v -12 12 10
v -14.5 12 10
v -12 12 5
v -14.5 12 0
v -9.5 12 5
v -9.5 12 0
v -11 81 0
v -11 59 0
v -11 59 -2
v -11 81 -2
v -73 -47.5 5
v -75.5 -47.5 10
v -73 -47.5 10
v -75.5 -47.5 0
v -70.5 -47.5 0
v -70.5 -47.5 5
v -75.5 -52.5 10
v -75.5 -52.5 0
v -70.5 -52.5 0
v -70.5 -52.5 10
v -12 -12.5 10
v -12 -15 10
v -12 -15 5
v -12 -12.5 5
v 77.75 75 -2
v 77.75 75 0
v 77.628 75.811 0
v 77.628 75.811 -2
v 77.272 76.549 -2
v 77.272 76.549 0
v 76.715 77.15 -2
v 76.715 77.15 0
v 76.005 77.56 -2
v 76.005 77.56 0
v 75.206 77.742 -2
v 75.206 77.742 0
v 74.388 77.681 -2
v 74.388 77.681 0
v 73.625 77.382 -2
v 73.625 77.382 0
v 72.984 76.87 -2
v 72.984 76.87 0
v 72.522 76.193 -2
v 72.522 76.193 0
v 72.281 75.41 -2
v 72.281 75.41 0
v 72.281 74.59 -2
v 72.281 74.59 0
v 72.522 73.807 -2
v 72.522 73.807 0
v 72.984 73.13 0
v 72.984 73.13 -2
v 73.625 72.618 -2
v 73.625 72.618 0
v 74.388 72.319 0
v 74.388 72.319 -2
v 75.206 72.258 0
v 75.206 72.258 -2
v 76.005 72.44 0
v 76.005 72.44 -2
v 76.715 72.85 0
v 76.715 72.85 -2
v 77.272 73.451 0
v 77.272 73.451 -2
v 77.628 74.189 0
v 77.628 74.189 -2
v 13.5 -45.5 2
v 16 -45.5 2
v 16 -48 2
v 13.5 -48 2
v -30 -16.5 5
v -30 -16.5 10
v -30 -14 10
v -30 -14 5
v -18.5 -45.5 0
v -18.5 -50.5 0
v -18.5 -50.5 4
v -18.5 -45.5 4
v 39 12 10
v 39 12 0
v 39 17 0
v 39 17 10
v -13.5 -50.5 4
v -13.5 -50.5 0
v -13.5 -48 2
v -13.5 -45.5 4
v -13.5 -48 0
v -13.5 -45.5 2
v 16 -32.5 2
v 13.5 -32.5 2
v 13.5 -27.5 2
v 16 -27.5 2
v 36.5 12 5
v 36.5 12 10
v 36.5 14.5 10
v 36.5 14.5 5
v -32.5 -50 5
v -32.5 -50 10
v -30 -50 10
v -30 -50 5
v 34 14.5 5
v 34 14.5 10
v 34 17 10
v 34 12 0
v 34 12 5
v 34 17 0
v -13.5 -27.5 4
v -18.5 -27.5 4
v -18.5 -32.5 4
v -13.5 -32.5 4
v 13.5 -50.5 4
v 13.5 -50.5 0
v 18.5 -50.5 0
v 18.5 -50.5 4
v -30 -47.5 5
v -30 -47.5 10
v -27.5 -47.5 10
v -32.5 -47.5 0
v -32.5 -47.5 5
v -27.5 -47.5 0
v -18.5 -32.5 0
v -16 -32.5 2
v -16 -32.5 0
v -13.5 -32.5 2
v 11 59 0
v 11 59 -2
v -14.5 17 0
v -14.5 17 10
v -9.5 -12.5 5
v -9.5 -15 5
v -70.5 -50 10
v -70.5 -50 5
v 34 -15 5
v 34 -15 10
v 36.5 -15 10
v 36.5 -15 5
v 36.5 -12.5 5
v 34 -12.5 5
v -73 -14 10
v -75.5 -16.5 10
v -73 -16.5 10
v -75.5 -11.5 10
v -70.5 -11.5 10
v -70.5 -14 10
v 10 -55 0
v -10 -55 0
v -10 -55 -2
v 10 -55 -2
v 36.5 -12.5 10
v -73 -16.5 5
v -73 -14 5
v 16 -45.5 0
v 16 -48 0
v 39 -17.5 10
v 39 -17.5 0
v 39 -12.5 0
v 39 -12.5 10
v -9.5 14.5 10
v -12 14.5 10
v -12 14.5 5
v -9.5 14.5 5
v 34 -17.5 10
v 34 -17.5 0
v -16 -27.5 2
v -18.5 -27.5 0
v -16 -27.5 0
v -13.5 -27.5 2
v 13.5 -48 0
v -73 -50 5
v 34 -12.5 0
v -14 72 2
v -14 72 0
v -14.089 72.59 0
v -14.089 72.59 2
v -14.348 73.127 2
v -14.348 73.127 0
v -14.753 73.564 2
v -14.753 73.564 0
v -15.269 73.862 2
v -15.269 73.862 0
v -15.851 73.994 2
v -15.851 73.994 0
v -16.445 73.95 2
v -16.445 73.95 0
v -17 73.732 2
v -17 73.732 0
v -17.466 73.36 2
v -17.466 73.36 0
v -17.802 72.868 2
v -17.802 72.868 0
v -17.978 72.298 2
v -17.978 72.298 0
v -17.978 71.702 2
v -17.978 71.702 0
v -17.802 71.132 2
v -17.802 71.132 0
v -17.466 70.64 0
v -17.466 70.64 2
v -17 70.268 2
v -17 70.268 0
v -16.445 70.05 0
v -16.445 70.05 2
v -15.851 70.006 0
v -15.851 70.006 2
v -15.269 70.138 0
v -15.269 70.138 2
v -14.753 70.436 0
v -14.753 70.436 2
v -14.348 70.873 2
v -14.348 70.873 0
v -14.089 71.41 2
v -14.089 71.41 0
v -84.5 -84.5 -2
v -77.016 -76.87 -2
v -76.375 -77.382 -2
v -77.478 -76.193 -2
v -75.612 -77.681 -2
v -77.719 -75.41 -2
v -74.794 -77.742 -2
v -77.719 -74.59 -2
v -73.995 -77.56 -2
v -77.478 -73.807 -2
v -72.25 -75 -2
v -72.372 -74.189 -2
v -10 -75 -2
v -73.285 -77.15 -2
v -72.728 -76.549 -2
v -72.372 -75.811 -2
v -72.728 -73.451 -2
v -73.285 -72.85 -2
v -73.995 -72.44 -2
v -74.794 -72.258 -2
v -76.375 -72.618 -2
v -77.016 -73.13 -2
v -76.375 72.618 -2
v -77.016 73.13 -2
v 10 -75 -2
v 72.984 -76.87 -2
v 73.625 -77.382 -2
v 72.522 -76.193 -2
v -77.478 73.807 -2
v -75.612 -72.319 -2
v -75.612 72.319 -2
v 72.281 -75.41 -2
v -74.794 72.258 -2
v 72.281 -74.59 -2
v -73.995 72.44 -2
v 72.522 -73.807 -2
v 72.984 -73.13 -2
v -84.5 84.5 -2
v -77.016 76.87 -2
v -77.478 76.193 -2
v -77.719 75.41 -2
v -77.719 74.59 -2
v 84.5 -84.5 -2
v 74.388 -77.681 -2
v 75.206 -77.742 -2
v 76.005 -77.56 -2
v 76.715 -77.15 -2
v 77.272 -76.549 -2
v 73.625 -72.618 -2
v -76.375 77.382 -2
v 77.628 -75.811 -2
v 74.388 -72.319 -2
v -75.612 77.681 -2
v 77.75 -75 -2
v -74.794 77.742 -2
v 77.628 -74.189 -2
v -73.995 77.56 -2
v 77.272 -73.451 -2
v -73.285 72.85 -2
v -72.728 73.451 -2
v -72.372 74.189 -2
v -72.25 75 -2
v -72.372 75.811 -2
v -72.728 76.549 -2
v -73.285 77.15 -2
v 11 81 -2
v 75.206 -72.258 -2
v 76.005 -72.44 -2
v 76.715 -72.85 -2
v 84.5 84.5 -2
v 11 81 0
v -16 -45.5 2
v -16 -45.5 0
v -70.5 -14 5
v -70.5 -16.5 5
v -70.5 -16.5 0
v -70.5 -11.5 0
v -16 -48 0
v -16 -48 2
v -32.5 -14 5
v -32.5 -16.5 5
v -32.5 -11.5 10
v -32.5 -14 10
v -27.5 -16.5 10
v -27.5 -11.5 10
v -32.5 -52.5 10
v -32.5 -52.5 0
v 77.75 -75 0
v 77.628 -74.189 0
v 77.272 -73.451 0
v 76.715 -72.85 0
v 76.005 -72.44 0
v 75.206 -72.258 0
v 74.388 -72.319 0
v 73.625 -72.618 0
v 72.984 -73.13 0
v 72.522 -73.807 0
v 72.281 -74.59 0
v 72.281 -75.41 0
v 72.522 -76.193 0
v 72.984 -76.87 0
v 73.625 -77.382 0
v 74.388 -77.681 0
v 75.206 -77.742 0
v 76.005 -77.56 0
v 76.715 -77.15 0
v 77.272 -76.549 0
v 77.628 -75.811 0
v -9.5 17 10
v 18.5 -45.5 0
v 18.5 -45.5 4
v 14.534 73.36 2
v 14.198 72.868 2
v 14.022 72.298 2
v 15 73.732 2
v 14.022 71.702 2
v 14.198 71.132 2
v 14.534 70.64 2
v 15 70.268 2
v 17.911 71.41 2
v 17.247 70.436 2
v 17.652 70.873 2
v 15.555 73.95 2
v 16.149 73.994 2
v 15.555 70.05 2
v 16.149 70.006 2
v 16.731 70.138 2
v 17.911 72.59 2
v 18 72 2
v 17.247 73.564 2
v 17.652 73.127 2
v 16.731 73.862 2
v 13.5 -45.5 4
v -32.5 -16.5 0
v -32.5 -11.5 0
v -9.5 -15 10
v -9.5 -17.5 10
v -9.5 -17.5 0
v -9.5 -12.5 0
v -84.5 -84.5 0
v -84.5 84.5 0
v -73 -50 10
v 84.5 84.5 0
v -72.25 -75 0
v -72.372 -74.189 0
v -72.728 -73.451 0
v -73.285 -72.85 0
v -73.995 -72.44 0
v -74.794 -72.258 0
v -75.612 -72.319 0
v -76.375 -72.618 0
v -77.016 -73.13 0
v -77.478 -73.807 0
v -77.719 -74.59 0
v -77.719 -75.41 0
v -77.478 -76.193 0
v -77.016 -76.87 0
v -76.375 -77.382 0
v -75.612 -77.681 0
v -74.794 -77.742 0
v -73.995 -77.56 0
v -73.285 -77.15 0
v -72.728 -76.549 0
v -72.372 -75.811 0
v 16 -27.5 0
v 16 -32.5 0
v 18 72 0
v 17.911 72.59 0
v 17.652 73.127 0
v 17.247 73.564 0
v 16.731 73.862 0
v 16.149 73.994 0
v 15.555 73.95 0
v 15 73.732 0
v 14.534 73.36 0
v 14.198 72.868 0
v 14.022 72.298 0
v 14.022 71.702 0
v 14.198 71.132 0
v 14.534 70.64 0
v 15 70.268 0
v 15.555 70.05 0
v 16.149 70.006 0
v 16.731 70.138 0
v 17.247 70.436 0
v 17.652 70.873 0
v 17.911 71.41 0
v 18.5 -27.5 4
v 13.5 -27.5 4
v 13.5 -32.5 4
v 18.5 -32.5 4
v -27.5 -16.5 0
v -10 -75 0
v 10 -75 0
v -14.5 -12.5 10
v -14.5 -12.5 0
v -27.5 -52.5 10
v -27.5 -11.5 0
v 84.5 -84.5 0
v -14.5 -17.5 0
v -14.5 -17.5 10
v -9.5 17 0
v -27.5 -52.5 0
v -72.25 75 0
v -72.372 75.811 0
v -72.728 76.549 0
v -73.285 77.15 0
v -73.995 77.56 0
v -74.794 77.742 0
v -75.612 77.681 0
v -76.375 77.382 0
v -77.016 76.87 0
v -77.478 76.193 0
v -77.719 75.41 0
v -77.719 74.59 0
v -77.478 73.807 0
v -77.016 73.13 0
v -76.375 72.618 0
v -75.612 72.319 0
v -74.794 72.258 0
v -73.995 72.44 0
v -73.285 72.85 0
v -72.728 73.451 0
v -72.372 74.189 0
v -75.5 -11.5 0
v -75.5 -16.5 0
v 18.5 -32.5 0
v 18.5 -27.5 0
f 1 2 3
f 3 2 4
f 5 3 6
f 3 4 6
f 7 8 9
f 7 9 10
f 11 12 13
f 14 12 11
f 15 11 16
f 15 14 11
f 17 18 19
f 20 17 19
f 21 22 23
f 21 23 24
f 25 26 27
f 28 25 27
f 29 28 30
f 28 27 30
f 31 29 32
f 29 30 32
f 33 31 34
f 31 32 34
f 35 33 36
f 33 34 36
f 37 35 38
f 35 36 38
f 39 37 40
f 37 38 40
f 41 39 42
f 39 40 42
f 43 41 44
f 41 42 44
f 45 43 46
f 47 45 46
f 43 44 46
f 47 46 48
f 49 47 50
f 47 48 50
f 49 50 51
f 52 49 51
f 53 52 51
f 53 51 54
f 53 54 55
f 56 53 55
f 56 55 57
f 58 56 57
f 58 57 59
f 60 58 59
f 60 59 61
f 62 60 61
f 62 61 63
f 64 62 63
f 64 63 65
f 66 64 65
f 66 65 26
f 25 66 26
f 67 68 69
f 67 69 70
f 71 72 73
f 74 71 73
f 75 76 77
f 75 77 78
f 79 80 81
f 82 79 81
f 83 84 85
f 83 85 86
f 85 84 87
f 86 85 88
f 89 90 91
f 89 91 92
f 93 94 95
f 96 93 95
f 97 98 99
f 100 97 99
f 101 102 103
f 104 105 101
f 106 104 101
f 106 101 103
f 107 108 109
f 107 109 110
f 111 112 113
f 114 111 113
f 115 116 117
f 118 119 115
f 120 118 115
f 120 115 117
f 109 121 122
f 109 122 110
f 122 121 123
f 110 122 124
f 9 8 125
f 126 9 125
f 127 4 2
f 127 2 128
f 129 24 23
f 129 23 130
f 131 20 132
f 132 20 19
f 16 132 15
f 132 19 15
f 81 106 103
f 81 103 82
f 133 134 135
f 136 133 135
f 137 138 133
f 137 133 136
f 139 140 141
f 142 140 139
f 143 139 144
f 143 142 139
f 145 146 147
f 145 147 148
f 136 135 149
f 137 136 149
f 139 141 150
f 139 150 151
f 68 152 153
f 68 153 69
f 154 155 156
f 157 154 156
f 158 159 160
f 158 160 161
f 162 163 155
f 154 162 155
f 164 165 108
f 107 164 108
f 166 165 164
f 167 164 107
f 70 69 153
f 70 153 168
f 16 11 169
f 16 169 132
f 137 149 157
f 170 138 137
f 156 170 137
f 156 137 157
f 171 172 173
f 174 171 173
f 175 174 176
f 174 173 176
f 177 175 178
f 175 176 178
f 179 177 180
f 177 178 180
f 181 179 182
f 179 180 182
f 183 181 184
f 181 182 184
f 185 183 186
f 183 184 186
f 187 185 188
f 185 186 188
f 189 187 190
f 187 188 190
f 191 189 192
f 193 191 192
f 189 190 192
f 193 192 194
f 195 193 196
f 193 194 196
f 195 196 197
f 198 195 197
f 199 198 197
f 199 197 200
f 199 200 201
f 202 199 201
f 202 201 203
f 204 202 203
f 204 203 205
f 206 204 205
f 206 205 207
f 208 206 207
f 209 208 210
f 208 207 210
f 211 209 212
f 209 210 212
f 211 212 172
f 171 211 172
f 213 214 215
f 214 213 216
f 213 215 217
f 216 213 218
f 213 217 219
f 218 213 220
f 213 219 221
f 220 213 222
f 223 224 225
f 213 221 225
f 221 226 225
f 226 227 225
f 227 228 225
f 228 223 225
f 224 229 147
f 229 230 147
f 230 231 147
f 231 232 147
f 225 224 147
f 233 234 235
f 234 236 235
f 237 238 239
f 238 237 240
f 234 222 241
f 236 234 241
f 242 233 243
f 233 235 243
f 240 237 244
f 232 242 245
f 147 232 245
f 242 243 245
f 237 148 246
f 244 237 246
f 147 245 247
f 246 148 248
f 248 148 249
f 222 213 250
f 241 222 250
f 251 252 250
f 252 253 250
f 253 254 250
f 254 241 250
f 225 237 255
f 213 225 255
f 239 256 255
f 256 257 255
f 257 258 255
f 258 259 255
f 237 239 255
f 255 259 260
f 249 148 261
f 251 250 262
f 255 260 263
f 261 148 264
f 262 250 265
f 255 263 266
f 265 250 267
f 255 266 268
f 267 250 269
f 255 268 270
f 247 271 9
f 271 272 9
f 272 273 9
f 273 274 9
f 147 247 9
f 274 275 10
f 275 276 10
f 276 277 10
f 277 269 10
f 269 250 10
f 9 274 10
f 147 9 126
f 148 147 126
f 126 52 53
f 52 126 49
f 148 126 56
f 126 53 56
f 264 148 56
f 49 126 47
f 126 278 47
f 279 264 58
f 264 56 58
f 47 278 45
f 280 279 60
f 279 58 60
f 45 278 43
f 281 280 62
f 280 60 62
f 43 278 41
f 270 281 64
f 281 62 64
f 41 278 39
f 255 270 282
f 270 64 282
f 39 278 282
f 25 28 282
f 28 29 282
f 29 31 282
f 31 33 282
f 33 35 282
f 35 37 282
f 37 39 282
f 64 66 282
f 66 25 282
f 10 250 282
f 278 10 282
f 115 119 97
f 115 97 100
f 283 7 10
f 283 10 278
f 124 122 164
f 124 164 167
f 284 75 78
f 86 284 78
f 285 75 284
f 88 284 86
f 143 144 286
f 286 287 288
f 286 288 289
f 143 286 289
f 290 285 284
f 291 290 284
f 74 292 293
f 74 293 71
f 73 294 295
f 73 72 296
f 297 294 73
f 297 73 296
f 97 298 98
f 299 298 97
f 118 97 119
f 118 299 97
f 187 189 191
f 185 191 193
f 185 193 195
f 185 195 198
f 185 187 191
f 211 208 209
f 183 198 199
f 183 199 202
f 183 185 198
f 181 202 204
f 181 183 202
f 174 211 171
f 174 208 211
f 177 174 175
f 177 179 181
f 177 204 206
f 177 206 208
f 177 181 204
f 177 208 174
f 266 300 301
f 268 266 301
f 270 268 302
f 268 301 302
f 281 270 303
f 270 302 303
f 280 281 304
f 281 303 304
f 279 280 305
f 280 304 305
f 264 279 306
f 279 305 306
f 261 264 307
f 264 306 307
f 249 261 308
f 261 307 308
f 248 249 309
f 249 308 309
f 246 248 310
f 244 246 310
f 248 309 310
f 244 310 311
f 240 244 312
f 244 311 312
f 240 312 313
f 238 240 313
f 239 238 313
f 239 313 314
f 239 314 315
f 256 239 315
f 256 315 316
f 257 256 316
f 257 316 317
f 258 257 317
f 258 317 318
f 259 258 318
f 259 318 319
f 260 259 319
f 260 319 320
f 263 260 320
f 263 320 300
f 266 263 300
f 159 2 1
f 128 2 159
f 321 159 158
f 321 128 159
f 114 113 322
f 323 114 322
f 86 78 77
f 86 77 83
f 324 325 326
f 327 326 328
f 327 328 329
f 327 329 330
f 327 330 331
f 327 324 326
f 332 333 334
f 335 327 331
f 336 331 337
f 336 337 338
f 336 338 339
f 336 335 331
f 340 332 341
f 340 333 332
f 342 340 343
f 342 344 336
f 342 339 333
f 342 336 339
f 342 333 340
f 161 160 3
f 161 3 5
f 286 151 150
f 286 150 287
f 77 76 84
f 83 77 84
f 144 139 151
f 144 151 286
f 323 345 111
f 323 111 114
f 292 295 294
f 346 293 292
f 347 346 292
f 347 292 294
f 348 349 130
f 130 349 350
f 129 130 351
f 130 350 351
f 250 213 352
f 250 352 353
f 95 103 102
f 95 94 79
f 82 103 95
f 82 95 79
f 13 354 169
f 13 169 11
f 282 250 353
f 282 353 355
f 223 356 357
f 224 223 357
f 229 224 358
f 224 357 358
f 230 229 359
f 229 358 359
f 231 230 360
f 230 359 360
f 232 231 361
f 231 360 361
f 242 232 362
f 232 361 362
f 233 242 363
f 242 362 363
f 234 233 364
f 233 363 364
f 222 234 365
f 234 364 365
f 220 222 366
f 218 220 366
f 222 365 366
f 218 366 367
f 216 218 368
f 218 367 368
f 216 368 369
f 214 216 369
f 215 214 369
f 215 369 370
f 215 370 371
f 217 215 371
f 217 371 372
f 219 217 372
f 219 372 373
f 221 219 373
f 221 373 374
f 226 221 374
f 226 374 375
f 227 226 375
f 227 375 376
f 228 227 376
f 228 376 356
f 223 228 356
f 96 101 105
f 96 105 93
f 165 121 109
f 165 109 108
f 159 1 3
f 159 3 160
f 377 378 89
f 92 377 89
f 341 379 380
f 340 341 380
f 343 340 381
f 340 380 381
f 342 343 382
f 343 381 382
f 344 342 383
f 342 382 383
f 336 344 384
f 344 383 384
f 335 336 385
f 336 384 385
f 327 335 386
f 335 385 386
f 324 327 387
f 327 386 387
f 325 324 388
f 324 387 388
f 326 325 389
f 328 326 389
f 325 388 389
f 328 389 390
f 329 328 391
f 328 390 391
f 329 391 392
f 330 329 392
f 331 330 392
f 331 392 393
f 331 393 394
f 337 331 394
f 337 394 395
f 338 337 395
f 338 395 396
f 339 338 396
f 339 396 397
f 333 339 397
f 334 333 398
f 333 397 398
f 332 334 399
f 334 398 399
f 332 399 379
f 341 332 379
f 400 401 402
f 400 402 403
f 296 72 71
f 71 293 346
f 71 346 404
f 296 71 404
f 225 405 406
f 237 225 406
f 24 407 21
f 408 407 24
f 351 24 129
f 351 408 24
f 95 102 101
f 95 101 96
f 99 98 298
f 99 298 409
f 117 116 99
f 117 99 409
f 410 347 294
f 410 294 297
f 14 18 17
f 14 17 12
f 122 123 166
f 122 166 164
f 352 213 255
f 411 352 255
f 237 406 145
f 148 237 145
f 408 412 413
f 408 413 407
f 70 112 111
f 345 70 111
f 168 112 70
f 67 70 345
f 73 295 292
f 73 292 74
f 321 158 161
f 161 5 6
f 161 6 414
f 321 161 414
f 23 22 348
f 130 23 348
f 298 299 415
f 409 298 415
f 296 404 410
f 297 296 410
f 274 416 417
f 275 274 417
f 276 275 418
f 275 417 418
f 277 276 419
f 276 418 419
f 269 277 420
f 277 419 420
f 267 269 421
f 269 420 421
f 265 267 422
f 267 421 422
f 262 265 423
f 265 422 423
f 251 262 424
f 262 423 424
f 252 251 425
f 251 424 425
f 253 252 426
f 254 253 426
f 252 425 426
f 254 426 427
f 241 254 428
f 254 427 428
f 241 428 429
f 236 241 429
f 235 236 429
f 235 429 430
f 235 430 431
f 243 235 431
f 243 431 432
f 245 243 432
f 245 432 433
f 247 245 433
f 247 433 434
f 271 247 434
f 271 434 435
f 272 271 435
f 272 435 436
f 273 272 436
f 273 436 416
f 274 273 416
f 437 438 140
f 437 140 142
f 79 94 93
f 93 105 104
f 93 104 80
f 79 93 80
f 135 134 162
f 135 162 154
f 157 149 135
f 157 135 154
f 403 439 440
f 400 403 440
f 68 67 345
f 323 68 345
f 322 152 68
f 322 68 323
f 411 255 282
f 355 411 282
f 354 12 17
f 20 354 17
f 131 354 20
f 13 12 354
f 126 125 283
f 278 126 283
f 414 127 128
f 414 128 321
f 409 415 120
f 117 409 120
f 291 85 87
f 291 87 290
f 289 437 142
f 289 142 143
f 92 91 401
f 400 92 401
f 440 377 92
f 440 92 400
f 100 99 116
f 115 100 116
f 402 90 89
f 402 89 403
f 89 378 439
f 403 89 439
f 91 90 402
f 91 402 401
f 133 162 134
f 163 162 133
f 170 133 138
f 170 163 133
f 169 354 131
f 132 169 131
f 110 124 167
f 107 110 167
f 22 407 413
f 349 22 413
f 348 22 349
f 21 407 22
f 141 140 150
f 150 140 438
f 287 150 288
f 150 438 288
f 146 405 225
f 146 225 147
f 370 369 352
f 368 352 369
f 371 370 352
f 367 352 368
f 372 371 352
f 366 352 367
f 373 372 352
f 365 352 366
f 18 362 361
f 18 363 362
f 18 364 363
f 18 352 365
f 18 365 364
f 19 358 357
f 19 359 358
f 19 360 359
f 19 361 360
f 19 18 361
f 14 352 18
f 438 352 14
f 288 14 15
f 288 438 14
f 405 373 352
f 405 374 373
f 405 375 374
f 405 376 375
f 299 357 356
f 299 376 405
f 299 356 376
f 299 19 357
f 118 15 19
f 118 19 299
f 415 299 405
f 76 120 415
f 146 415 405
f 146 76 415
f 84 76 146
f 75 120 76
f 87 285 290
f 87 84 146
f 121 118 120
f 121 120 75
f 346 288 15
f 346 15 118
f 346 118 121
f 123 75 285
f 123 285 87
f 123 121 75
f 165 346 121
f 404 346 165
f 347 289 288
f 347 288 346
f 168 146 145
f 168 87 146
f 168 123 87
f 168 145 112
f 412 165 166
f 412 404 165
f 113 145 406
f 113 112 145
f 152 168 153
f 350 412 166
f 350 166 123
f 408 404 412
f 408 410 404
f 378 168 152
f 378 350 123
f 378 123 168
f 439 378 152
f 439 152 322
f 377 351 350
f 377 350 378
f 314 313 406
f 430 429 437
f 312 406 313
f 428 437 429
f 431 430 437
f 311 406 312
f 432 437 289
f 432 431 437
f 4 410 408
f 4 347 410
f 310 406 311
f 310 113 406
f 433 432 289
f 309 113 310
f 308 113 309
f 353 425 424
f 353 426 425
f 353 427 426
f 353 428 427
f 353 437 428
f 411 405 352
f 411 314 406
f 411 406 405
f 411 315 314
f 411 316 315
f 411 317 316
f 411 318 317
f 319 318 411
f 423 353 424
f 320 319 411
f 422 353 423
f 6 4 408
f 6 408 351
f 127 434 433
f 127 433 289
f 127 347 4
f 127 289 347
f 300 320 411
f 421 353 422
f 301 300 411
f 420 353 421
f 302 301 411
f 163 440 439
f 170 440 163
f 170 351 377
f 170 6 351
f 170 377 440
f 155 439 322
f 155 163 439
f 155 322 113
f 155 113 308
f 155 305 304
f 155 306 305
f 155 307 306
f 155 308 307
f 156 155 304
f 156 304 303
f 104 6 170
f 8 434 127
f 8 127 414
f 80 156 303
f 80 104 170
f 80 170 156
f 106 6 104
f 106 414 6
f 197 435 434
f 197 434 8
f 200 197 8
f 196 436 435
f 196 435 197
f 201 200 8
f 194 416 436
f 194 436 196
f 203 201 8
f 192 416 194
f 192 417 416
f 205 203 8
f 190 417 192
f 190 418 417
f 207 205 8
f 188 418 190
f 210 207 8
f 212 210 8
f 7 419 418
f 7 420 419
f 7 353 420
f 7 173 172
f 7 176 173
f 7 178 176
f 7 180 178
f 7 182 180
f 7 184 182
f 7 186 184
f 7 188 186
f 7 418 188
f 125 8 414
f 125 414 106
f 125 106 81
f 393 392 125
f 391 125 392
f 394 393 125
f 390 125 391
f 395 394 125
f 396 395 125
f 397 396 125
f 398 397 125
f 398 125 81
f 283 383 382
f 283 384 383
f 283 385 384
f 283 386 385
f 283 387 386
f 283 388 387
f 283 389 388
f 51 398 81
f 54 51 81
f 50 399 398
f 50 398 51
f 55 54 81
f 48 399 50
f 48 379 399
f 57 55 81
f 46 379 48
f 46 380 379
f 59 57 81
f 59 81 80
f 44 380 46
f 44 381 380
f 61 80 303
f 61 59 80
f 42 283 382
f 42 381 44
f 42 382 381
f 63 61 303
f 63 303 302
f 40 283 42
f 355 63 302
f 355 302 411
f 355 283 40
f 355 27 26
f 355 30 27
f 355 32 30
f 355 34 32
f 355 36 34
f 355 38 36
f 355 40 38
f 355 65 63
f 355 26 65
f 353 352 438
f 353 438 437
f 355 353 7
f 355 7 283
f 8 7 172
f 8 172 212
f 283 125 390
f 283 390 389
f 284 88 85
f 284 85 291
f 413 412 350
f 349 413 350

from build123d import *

# Parameters (mm, degrees)
SKETCH_W        = 169
SKETCH_H        = 169
PAD_DEPTH       = 2
SKETCH002_W     = 20
SKETCH002_H     = 20
SKETCH002_W_2   = 22
SKETCH002_H_2   = 22
POCKET001_DEPTH = 2
SKETCH003_R     = 2
PAD001_DEPTH    = 2
SKETCH005_W     = 5
SKETCH005_H     = 5
PAD003_DEPTH    = 10
SKETCH007_W     = 5
SKETCH007_H     = 5
PAD004_DEPTH    = 10
SKETCH001_R     = 2.75
POCKET_DEPTH    = 2.001
SKETCH016_W     = 5
SKETCH016_H     = 5
PAD005_DEPTH    = 4
SKETCH017_W     = 2.5
SKETCH017_H     = 2
POCKET010_DEPTH = 5
SKETCH018_W     = 2.5
SKETCH018_H     = 2
POCKET011_DEPTH = 5
SKETCH019_W     = 2.5
SKETCH019_H     = 2
POCKET012_DEPTH = 2.5
SKETCH020_W     = 2.5
SKETCH020_H     = 2
POCKET013_DEPTH = 2.5
SKETCH021_W     = 2.5
SKETCH021_H     = 2.5
POCKET014_DEPTH = 5
SKETCH022_W     = 2.5
SKETCH022_H     = 2.5
POCKET015_DEPTH = 5
SKETCH023_W     = 2.5
SKETCH023_H     = 2.5
POCKET016_DEPTH = 5
SKETCH024_W     = 2.5
SKETCH024_H     = 2.5
POCKET017_DEPTH = 5
SKETCH025_W     = 2.5
SKETCH025_H     = 2.5
POCKET018_DEPTH = 5
SKETCH026_W     = 2.5
SKETCH026_H     = 2.5
POCKET019_DEPTH = 5
SKETCH027_W     = 2.5
SKETCH027_H     = 2.5
POCKET020_DEPTH = 5
SKETCH028_W     = 2.5
SKETCH028_H     = 2.5
POCKET021_DEPTH = 5


with BuildPart() as part:
    # Sketch (on DatumPlane) → Pad (new body)
    with BuildSketch(Plane.XY.offset(-2)):
        Rectangle(SKETCH_W, SKETCH_H)
    extrude(amount=PAD_DEPTH)

    # Sketch002 (on DatumPlane) → Pocket001 (cut)
    with BuildSketch(Plane.XY):
        with Locations((0, -65)):
            Rectangle(SKETCH002_W, SKETCH002_H)
        with Locations((0, 70)):
            Rectangle(SKETCH002_W_2, SKETCH002_H_2)
    extrude(amount=-POCKET001_DEPTH, mode=Mode.SUBTRACT)

    # Sketch003 (on DatumPlane) → Pad001 (join)
    with BuildSketch(Plane.XY):
        with Locations((-16, 72)):
            Circle(SKETCH003_R)
        with Locations((16, 72)):
            Circle(SKETCH003_R)
    extrude(amount=PAD001_DEPTH)

    # Sketch005 (on DatumPlane) → Pad003 (join)
    with BuildSketch(Plane.XY):
        with Locations((-12, 14.5)):
            Rectangle(SKETCH005_W, SKETCH005_H)
        with Locations((36.5, 14.5)):
            Rectangle(SKETCH005_W, SKETCH005_H)
        with Locations((-12, -15)):
            Rectangle(SKETCH005_W, SKETCH005_H)
        with Locations((36.5, -15)):
            Rectangle(SKETCH005_W, SKETCH005_H)
    extrude(amount=PAD003_DEPTH)

    # Sketch007 (on DatumPlane) → Pad004 (join)
    with BuildSketch(Plane.XY):
        with Locations((-73, -14)):
            Rectangle(SKETCH007_W, SKETCH007_H)
        with Locations((-30, -14)):
            Rectangle(SKETCH007_W, SKETCH007_H)
        with Locations((-73, -50)):
            Rectangle(SKETCH007_W, SKETCH007_H)
        with Locations((-30, -50)):
            Rectangle(SKETCH007_W, SKETCH007_H)
    extrude(amount=PAD004_DEPTH)

    # Sketch001 (on DatumPlane) → Pocket (cut, through all)
    with BuildSketch(Plane.XY):
        with Locations((75, 75)):
            Circle(SKETCH001_R)
        with Locations((75, -75)):
            Circle(SKETCH001_R)
        with Locations((-75, -75)):
            Circle(SKETCH001_R)
        with Locations((-75, 75)):
            Circle(SKETCH001_R)
    extrude(amount=-POCKET_DEPTH, mode=Mode.SUBTRACT)

    # Sketch016 (on DatumPlane) → Pad005 (join)
    with BuildSketch(Plane.XY):
        with Locations((-16, -30)):
            Rectangle(SKETCH016_W, SKETCH016_H)
        with Locations((16, -30)):
            Rectangle(SKETCH016_W, SKETCH016_H)
        with Locations((-16, -48)):
            Rectangle(SKETCH016_W, SKETCH016_H)
        with Locations((16, -48)):
            Rectangle(SKETCH016_W, SKETCH016_H)
    extrude(amount=PAD005_DEPTH)

    # Sketch017 (on Face36 of Pad005) → Pocket010 (cut)
    with BuildSketch(Plane.XZ.offset(32.5)):
        with Locations((-14.75, 1)):
            Rectangle(SKETCH017_W, SKETCH017_H)
    extrude(amount=-POCKET010_DEPTH, mode=Mode.SUBTRACT)

    # Sketch018 (on Face60 of Pocket010) → Pocket011 (cut)
    with BuildSketch(Plane.XZ.offset(32.5)):
        with Locations((14.75, 1)):
            Rectangle(SKETCH018_W, SKETCH018_H)
    extrude(amount=-POCKET011_DEPTH, mode=Mode.SUBTRACT)

    # Sketch019 (on Face35 of Pocket011) → Pocket012 (cut)
    with BuildSketch(Plane(origin=(0, -45.5, 0), x_dir=(-1, 0, 0), z_dir=(0, 1, 0))):
        with Locations((-14.75, 1)):
            Rectangle(SKETCH019_W, SKETCH019_H)
    extrude(amount=-POCKET012_DEPTH, mode=Mode.SUBTRACT)

    # Sketch020 (on Face38 of Pocket012) → Pocket013 (cut)
    with BuildSketch(Plane(origin=(0, -45.5, 0), x_dir=(-1, 0, 0), z_dir=(0, 1, 0))):
        with Locations((14.75, 1)):
            Rectangle(SKETCH020_W, SKETCH020_H)
    extrude(amount=-POCKET013_DEPTH, mode=Mode.SUBTRACT)

    # Sketch021 (on Face36 of Pocket013) → Pocket014 (cut)
    with BuildSketch(Plane.XY.offset(10)):
        with Locations((-71.75, -15.25)):
            Rectangle(SKETCH021_W, SKETCH021_H)
    extrude(amount=-POCKET014_DEPTH, mode=Mode.SUBTRACT)

    # Sketch022 (on Face87 of Pocket014) → Pocket015 (cut)
    with BuildSketch(Plane.XY.offset(10)):
        with Locations((-31.25, -15.25)):
            Rectangle(SKETCH022_W, SKETCH022_H)
    extrude(amount=-POCKET015_DEPTH, mode=Mode.SUBTRACT)

    # Sketch023 (on Face85 of Pocket015) → Pocket016 (cut)
    with BuildSketch(Plane.XY.offset(10)):
        with Locations((-71.75, -48.75)):
            Rectangle(SKETCH023_W, SKETCH023_H)
    extrude(amount=-POCKET016_DEPTH, mode=Mode.SUBTRACT)

    # Sketch024 (on Face73 of Pocket016) → Pocket017 (cut)
    with BuildSketch(Plane.XY.offset(10)):
        with Locations((-31.25, -48.75)):
            Rectangle(SKETCH024_W, SKETCH024_H)
    extrude(amount=-POCKET017_DEPTH, mode=Mode.SUBTRACT)

    # Sketch025 (on Face92 of Pocket017) → Pocket018 (cut)
    with BuildSketch(Plane.XY.offset(10)):
        with Locations((-10.75, 13.25)):
            Rectangle(SKETCH025_W, SKETCH025_H)
    extrude(amount=-POCKET018_DEPTH, mode=Mode.SUBTRACT)

    # Sketch026 (on Face87 of Pocket018) → Pocket019 (cut)
    with BuildSketch(Plane.XY.offset(10)):
        with Locations((35.25, 13.25)):
            Rectangle(SKETCH026_W, SKETCH026_H)
    extrude(amount=-POCKET019_DEPTH, mode=Mode.SUBTRACT)

    # Sketch027 (on Face85 of Pocket019) → Pocket020 (cut)
    with BuildSketch(Plane.XY.offset(10)):
        with Locations((-10.75, -13.75)):
            Rectangle(SKETCH027_W, SKETCH027_H)
    extrude(amount=-POCKET020_DEPTH, mode=Mode.SUBTRACT)

    # Sketch028 (on Face89 of Pocket020) → Pocket021 (cut)
    with BuildSketch(Plane.XY.offset(10)):
        with Locations((35.25, -13.75)):
            Rectangle(SKETCH028_W, SKETCH028_H)
    extrude(amount=-POCKET021_DEPTH, mode=Mode.SUBTRACT)


solid = part.part
